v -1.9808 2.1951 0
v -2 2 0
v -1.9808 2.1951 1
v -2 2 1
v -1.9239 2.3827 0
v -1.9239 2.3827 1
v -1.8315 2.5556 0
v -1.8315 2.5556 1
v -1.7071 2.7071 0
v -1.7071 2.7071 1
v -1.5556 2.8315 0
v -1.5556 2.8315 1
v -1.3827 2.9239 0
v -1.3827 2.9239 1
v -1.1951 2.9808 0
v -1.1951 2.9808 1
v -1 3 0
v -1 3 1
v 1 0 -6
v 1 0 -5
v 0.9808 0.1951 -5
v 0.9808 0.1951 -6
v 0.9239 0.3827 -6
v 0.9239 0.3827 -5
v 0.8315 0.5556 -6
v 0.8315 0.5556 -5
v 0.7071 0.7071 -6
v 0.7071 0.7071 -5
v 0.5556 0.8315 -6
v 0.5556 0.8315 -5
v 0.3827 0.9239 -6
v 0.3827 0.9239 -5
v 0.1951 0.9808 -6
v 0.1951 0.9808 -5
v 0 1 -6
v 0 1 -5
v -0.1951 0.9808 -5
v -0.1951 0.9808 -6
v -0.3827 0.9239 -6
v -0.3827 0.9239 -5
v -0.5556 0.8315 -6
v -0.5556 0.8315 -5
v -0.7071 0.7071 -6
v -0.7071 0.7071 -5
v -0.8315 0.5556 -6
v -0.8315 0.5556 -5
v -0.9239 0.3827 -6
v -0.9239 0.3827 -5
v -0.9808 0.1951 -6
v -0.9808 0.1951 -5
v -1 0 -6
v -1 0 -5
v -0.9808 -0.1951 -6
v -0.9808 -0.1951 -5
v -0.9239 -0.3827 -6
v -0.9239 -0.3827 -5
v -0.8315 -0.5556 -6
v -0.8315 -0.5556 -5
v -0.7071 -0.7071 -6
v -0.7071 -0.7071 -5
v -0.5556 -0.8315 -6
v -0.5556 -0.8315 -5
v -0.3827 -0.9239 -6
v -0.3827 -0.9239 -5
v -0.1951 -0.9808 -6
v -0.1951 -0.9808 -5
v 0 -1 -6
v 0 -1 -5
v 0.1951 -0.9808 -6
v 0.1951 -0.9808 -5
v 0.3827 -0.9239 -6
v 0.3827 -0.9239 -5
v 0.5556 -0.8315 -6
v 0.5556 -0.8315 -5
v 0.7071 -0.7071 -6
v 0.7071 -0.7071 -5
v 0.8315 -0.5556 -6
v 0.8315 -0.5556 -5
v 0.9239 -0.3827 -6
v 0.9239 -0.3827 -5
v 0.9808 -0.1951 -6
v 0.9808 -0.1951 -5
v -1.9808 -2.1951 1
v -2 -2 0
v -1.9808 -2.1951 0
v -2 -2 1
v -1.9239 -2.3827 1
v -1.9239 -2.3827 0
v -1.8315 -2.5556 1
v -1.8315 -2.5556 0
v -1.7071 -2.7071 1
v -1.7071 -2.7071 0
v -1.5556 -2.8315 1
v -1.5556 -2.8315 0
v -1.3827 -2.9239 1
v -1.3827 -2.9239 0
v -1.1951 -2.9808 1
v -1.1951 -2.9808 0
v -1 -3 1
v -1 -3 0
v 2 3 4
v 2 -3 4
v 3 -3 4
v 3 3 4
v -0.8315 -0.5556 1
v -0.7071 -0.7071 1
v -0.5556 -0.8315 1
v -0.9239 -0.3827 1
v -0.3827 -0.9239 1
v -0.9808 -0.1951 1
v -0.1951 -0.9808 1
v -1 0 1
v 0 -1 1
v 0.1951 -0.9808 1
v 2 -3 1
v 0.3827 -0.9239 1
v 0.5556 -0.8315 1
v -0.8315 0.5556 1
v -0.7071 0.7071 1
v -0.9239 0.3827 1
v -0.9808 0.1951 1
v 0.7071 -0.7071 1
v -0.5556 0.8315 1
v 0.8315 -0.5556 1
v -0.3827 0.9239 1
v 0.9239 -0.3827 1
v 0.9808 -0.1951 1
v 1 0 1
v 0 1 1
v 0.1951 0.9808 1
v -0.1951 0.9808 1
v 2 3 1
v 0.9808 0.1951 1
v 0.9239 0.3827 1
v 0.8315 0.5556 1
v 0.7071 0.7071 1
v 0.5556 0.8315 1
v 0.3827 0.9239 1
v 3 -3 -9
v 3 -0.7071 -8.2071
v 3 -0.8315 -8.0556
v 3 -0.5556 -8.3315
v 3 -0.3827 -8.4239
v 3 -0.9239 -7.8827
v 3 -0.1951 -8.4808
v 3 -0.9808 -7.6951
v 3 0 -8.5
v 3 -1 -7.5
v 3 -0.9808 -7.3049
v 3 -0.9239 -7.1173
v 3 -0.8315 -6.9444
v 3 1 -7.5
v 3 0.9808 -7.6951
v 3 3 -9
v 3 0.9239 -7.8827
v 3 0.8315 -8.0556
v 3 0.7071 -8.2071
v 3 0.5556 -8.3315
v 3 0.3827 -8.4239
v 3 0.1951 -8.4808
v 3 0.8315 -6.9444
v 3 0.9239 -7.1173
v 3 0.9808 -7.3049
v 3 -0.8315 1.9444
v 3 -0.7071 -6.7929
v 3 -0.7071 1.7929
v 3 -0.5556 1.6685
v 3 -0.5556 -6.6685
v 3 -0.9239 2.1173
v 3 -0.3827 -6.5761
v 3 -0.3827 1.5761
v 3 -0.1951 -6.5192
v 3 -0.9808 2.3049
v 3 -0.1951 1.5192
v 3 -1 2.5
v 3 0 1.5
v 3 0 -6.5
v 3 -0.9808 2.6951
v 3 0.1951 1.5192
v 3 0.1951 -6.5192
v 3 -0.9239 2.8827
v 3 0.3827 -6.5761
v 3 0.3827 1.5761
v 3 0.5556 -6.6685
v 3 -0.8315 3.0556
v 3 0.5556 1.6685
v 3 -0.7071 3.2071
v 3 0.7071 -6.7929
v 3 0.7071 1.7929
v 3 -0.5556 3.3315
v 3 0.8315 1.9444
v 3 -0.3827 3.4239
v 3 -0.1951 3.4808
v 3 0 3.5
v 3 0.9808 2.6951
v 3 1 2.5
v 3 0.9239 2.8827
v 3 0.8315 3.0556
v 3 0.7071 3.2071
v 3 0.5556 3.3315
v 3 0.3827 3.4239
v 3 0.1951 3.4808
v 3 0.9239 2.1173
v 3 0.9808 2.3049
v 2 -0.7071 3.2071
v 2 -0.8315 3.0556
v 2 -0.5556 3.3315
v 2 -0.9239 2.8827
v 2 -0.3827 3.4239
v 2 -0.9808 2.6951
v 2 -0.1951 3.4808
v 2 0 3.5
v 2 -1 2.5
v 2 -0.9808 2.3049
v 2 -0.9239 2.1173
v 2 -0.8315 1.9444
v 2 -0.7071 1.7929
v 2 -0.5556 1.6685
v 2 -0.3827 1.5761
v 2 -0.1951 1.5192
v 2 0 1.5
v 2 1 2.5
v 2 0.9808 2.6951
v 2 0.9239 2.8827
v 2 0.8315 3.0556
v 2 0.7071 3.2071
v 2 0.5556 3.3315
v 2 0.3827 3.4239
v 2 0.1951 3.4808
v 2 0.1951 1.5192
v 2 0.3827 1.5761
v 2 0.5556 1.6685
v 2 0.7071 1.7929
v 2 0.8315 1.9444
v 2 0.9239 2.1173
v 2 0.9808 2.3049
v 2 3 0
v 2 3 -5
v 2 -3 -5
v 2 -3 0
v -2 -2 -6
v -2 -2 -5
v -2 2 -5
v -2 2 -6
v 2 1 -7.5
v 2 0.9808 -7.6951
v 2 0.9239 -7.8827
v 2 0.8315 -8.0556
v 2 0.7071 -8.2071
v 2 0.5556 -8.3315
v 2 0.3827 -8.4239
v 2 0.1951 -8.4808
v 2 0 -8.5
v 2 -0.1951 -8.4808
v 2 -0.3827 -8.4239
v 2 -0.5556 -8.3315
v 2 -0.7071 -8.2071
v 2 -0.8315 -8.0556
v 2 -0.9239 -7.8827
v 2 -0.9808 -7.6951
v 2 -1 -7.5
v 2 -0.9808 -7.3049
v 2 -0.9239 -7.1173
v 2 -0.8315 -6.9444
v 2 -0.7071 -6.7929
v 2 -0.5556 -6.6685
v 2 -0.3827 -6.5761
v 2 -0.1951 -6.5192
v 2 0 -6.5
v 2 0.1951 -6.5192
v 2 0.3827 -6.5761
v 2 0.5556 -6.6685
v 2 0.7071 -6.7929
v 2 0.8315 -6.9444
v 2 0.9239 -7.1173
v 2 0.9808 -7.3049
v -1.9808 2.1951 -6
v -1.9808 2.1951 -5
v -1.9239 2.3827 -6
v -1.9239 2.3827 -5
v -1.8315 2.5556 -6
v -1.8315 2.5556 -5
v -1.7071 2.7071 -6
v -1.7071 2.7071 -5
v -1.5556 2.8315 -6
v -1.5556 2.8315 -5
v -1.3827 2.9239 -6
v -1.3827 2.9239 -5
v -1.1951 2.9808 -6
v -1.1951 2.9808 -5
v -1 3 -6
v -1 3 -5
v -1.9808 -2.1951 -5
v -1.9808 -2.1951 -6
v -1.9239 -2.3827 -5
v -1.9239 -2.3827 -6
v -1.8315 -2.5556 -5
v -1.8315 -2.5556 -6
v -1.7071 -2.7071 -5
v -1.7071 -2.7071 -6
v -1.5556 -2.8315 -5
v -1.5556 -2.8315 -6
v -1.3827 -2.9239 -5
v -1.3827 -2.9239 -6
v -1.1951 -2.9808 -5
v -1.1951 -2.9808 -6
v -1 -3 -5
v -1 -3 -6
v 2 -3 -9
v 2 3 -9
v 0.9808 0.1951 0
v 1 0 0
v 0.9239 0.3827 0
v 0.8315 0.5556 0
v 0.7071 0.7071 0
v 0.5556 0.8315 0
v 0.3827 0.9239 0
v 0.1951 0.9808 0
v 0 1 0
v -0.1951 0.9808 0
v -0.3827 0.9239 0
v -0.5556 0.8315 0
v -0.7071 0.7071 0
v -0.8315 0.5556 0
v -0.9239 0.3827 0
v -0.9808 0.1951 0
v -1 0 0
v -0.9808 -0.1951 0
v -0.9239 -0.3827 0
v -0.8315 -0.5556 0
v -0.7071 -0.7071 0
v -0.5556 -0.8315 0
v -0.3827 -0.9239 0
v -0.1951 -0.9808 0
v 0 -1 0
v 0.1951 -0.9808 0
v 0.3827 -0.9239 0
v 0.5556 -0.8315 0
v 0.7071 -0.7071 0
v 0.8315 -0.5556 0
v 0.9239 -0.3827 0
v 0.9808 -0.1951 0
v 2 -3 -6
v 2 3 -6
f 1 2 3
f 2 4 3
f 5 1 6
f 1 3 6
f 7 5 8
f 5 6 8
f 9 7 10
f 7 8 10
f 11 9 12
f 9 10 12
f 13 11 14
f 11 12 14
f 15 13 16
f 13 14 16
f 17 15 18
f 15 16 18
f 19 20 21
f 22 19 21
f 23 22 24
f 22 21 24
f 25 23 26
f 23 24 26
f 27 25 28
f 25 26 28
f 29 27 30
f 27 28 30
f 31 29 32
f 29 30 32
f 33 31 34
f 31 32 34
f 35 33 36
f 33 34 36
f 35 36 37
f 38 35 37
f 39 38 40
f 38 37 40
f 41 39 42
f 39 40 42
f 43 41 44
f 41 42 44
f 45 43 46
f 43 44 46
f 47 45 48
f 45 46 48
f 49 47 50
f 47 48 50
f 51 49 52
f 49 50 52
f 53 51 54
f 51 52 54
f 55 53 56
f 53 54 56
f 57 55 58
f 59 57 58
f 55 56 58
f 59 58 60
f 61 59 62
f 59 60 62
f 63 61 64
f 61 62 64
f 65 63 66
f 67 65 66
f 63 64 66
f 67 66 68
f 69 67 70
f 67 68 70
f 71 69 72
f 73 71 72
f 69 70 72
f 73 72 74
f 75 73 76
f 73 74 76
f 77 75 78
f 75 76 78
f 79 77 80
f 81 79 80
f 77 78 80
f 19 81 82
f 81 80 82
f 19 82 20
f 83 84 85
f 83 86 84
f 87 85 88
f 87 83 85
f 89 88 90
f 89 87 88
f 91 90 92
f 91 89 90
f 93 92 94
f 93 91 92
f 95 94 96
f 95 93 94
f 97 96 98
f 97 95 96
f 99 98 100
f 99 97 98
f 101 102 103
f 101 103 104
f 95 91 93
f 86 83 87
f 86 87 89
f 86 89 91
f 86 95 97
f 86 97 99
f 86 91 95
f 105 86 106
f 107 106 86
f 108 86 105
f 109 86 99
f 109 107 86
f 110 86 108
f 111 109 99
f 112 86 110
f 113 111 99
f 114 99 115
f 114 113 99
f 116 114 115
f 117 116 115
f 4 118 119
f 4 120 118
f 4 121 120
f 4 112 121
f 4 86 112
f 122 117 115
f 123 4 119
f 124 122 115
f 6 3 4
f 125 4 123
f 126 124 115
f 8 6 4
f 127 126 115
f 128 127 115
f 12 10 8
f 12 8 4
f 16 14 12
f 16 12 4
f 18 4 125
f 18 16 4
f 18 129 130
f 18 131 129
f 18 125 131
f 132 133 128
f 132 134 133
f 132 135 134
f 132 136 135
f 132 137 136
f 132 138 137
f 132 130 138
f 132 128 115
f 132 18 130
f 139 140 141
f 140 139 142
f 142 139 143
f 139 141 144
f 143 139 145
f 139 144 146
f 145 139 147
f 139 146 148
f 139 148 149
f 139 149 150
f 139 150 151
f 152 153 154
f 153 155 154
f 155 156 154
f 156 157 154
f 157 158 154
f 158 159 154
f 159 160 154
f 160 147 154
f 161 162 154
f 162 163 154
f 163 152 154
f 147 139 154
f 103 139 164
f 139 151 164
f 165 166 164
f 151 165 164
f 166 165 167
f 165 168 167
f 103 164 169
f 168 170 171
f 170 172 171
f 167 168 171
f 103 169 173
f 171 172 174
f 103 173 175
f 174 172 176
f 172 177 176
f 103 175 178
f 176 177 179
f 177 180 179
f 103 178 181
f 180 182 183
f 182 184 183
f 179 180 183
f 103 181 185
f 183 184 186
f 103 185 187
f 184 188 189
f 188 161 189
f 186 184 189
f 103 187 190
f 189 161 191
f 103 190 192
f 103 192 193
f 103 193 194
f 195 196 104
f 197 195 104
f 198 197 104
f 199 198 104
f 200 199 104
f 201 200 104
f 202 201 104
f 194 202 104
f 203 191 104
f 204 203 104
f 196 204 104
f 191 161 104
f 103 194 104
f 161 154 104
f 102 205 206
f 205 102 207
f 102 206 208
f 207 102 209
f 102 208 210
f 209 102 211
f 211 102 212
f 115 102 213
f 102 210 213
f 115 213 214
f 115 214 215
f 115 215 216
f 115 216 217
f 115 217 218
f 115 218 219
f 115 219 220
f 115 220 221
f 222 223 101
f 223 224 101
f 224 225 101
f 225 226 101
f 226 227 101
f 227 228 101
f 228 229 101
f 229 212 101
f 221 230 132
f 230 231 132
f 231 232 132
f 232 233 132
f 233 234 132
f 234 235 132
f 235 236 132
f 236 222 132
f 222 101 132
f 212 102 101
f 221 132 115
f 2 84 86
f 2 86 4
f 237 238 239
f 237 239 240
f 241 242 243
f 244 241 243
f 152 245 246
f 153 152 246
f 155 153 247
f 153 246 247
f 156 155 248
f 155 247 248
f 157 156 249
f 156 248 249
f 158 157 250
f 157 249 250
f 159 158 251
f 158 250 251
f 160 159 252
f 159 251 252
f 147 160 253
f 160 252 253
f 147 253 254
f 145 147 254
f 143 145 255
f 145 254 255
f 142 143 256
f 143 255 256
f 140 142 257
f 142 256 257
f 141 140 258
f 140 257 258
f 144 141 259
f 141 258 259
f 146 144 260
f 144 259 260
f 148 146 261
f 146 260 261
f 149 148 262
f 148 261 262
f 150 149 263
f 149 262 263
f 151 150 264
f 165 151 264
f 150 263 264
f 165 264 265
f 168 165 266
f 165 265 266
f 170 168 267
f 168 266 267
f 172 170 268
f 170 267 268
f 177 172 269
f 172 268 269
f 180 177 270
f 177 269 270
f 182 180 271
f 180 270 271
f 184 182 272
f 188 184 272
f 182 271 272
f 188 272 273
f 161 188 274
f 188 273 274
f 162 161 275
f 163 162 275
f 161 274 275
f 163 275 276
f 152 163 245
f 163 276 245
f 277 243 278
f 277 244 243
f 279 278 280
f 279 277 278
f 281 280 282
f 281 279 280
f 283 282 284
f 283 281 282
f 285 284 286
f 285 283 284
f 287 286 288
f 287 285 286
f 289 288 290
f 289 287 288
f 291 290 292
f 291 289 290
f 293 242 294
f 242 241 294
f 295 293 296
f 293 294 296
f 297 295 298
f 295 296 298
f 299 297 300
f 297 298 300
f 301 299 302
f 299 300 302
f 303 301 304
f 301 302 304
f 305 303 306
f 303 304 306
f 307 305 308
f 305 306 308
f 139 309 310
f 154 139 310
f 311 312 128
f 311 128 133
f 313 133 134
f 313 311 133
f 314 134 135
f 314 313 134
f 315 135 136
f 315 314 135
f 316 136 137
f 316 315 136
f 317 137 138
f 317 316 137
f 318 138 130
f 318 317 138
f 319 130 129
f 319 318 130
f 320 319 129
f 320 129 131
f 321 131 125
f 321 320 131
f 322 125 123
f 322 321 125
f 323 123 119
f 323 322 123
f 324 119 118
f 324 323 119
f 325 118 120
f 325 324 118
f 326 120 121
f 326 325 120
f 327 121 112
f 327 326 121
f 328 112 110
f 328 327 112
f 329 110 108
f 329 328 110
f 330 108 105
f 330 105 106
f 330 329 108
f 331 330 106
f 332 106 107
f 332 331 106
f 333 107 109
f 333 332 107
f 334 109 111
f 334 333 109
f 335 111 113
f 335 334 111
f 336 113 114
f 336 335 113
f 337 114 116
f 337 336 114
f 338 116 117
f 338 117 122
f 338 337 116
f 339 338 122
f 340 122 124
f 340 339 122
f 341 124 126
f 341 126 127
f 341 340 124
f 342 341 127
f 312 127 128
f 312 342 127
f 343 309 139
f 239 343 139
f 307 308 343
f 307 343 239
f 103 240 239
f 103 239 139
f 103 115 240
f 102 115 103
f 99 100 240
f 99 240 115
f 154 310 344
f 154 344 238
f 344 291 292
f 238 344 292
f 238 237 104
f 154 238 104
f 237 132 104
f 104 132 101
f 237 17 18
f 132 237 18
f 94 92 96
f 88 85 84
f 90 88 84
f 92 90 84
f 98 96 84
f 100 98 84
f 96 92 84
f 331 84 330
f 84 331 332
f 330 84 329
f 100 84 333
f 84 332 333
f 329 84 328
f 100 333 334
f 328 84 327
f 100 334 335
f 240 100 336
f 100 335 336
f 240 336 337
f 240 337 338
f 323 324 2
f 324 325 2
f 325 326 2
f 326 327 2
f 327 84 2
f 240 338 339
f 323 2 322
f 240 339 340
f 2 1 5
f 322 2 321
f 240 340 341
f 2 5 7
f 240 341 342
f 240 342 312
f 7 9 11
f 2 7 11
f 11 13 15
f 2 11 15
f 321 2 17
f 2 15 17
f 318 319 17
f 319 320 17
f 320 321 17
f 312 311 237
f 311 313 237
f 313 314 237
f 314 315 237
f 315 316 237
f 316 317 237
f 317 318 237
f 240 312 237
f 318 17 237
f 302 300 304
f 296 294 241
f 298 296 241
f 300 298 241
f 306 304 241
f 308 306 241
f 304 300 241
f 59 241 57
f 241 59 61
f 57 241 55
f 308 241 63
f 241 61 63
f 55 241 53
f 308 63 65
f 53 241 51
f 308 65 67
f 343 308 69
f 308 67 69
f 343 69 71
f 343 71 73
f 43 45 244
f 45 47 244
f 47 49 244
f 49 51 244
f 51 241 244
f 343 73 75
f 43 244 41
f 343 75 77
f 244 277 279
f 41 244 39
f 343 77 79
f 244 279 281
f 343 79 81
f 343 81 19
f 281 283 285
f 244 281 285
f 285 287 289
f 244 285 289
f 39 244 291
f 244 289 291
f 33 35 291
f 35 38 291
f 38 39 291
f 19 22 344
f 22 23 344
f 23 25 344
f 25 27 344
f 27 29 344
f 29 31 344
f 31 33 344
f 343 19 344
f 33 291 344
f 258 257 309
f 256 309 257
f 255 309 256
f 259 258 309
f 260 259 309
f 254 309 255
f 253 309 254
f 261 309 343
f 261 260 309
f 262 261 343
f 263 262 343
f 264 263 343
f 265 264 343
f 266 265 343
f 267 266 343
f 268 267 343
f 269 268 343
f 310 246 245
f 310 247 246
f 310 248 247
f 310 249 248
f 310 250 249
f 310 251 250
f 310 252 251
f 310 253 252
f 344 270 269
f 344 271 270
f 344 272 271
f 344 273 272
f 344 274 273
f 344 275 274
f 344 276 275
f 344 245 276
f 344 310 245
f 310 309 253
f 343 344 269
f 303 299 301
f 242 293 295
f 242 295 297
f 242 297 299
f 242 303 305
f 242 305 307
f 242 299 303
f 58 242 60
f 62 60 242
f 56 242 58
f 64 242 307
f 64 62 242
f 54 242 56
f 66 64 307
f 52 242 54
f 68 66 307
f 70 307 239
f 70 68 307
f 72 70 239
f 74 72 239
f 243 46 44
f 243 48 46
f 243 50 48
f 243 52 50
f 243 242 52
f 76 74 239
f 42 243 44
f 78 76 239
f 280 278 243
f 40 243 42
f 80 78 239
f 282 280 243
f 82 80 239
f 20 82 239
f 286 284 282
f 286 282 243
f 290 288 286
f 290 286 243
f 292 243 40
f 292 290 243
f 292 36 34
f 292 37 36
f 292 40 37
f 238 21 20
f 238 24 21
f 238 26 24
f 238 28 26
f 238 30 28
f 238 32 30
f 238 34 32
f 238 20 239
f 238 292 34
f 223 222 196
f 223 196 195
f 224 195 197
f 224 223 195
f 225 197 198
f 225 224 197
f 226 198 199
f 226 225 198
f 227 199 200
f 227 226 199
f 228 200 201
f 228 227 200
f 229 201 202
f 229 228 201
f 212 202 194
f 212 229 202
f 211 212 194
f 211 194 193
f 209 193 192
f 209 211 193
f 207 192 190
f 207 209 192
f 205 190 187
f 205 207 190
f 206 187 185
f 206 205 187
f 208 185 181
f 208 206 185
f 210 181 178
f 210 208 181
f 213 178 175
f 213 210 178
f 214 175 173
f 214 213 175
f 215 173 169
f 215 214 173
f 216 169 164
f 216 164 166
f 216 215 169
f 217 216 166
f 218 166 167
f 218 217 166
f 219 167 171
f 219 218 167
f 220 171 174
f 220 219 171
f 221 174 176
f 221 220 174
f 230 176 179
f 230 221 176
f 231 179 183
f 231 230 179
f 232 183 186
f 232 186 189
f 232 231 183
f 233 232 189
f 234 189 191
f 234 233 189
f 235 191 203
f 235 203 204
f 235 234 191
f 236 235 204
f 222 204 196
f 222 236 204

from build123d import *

# Parameters (mm, degrees)
SKETCH_1_W      = 4
SKETCH_1_H      = 6
SKETCH_1_R      = 1
EXTRUDE_1_DEPTH = 1
SKETCH_2_W      = 3
SKETCH_2_H      = 6
SKETCH_2_R      = 1
SKETCH_2_W_2    = 3.5
EXTRUDE_2_DEPTH = 1
FILLET_1_R      = 1


with BuildPart() as part:
    # 草图1 → 凸台-拉伸1 (new body)
    with BuildSketch(Plane.XY):
        Rectangle(SKETCH_1_W, SKETCH_1_H)
        Circle(SKETCH_1_R, mode=Mode.SUBTRACT)
    extrude(amount=EXTRUDE_1_DEPTH)

    # 草图2 → 凸台-拉伸2 (add)
    # profile 1 of 2: a face of its own
    with BuildSketch(Plane(origin=(2, 0, 0), x_dir=(0, 0, -1), z_dir=(1, 0, 0))):
        with Locations((-2.5, 0)):
            Rectangle(SKETCH_2_W, SKETCH_2_H)
        with Locations(Location((-2.5, 0, 0), (0, 0, 90))):
            Circle(SKETCH_2_R, mode=Mode.SUBTRACT)
    # profile 2 of 2: a face of its own
    with BuildSketch(Plane(origin=(2, 0, 0), x_dir=(0, 0, -1), z_dir=(1, 0, 0))):
        with Locations((0.75, 0)):
            Rectangle(SKETCH_2_W_2, SKETCH_2_H)
    extrude(amount=EXTRUDE_2_DEPTH)

    # 圆角1
    fillet_1_edges = [part.edges().sort_by_distance(p)[0] for p in [
        (-2, -3, 0.5),
        (-2, 3, 0.5),
    ]]
    fillet(fillet_1_edges, radius=FILLET_1_R)

    # 镜向1: part across plane


with BuildPart() as part_1:
    add(part.part)
    add(part.part.mirror(Plane(origin=(3, 0, -2.5), x_dir=(1, 0, 0), z_dir=(0, 0, 1))))


solid = part_1.part
